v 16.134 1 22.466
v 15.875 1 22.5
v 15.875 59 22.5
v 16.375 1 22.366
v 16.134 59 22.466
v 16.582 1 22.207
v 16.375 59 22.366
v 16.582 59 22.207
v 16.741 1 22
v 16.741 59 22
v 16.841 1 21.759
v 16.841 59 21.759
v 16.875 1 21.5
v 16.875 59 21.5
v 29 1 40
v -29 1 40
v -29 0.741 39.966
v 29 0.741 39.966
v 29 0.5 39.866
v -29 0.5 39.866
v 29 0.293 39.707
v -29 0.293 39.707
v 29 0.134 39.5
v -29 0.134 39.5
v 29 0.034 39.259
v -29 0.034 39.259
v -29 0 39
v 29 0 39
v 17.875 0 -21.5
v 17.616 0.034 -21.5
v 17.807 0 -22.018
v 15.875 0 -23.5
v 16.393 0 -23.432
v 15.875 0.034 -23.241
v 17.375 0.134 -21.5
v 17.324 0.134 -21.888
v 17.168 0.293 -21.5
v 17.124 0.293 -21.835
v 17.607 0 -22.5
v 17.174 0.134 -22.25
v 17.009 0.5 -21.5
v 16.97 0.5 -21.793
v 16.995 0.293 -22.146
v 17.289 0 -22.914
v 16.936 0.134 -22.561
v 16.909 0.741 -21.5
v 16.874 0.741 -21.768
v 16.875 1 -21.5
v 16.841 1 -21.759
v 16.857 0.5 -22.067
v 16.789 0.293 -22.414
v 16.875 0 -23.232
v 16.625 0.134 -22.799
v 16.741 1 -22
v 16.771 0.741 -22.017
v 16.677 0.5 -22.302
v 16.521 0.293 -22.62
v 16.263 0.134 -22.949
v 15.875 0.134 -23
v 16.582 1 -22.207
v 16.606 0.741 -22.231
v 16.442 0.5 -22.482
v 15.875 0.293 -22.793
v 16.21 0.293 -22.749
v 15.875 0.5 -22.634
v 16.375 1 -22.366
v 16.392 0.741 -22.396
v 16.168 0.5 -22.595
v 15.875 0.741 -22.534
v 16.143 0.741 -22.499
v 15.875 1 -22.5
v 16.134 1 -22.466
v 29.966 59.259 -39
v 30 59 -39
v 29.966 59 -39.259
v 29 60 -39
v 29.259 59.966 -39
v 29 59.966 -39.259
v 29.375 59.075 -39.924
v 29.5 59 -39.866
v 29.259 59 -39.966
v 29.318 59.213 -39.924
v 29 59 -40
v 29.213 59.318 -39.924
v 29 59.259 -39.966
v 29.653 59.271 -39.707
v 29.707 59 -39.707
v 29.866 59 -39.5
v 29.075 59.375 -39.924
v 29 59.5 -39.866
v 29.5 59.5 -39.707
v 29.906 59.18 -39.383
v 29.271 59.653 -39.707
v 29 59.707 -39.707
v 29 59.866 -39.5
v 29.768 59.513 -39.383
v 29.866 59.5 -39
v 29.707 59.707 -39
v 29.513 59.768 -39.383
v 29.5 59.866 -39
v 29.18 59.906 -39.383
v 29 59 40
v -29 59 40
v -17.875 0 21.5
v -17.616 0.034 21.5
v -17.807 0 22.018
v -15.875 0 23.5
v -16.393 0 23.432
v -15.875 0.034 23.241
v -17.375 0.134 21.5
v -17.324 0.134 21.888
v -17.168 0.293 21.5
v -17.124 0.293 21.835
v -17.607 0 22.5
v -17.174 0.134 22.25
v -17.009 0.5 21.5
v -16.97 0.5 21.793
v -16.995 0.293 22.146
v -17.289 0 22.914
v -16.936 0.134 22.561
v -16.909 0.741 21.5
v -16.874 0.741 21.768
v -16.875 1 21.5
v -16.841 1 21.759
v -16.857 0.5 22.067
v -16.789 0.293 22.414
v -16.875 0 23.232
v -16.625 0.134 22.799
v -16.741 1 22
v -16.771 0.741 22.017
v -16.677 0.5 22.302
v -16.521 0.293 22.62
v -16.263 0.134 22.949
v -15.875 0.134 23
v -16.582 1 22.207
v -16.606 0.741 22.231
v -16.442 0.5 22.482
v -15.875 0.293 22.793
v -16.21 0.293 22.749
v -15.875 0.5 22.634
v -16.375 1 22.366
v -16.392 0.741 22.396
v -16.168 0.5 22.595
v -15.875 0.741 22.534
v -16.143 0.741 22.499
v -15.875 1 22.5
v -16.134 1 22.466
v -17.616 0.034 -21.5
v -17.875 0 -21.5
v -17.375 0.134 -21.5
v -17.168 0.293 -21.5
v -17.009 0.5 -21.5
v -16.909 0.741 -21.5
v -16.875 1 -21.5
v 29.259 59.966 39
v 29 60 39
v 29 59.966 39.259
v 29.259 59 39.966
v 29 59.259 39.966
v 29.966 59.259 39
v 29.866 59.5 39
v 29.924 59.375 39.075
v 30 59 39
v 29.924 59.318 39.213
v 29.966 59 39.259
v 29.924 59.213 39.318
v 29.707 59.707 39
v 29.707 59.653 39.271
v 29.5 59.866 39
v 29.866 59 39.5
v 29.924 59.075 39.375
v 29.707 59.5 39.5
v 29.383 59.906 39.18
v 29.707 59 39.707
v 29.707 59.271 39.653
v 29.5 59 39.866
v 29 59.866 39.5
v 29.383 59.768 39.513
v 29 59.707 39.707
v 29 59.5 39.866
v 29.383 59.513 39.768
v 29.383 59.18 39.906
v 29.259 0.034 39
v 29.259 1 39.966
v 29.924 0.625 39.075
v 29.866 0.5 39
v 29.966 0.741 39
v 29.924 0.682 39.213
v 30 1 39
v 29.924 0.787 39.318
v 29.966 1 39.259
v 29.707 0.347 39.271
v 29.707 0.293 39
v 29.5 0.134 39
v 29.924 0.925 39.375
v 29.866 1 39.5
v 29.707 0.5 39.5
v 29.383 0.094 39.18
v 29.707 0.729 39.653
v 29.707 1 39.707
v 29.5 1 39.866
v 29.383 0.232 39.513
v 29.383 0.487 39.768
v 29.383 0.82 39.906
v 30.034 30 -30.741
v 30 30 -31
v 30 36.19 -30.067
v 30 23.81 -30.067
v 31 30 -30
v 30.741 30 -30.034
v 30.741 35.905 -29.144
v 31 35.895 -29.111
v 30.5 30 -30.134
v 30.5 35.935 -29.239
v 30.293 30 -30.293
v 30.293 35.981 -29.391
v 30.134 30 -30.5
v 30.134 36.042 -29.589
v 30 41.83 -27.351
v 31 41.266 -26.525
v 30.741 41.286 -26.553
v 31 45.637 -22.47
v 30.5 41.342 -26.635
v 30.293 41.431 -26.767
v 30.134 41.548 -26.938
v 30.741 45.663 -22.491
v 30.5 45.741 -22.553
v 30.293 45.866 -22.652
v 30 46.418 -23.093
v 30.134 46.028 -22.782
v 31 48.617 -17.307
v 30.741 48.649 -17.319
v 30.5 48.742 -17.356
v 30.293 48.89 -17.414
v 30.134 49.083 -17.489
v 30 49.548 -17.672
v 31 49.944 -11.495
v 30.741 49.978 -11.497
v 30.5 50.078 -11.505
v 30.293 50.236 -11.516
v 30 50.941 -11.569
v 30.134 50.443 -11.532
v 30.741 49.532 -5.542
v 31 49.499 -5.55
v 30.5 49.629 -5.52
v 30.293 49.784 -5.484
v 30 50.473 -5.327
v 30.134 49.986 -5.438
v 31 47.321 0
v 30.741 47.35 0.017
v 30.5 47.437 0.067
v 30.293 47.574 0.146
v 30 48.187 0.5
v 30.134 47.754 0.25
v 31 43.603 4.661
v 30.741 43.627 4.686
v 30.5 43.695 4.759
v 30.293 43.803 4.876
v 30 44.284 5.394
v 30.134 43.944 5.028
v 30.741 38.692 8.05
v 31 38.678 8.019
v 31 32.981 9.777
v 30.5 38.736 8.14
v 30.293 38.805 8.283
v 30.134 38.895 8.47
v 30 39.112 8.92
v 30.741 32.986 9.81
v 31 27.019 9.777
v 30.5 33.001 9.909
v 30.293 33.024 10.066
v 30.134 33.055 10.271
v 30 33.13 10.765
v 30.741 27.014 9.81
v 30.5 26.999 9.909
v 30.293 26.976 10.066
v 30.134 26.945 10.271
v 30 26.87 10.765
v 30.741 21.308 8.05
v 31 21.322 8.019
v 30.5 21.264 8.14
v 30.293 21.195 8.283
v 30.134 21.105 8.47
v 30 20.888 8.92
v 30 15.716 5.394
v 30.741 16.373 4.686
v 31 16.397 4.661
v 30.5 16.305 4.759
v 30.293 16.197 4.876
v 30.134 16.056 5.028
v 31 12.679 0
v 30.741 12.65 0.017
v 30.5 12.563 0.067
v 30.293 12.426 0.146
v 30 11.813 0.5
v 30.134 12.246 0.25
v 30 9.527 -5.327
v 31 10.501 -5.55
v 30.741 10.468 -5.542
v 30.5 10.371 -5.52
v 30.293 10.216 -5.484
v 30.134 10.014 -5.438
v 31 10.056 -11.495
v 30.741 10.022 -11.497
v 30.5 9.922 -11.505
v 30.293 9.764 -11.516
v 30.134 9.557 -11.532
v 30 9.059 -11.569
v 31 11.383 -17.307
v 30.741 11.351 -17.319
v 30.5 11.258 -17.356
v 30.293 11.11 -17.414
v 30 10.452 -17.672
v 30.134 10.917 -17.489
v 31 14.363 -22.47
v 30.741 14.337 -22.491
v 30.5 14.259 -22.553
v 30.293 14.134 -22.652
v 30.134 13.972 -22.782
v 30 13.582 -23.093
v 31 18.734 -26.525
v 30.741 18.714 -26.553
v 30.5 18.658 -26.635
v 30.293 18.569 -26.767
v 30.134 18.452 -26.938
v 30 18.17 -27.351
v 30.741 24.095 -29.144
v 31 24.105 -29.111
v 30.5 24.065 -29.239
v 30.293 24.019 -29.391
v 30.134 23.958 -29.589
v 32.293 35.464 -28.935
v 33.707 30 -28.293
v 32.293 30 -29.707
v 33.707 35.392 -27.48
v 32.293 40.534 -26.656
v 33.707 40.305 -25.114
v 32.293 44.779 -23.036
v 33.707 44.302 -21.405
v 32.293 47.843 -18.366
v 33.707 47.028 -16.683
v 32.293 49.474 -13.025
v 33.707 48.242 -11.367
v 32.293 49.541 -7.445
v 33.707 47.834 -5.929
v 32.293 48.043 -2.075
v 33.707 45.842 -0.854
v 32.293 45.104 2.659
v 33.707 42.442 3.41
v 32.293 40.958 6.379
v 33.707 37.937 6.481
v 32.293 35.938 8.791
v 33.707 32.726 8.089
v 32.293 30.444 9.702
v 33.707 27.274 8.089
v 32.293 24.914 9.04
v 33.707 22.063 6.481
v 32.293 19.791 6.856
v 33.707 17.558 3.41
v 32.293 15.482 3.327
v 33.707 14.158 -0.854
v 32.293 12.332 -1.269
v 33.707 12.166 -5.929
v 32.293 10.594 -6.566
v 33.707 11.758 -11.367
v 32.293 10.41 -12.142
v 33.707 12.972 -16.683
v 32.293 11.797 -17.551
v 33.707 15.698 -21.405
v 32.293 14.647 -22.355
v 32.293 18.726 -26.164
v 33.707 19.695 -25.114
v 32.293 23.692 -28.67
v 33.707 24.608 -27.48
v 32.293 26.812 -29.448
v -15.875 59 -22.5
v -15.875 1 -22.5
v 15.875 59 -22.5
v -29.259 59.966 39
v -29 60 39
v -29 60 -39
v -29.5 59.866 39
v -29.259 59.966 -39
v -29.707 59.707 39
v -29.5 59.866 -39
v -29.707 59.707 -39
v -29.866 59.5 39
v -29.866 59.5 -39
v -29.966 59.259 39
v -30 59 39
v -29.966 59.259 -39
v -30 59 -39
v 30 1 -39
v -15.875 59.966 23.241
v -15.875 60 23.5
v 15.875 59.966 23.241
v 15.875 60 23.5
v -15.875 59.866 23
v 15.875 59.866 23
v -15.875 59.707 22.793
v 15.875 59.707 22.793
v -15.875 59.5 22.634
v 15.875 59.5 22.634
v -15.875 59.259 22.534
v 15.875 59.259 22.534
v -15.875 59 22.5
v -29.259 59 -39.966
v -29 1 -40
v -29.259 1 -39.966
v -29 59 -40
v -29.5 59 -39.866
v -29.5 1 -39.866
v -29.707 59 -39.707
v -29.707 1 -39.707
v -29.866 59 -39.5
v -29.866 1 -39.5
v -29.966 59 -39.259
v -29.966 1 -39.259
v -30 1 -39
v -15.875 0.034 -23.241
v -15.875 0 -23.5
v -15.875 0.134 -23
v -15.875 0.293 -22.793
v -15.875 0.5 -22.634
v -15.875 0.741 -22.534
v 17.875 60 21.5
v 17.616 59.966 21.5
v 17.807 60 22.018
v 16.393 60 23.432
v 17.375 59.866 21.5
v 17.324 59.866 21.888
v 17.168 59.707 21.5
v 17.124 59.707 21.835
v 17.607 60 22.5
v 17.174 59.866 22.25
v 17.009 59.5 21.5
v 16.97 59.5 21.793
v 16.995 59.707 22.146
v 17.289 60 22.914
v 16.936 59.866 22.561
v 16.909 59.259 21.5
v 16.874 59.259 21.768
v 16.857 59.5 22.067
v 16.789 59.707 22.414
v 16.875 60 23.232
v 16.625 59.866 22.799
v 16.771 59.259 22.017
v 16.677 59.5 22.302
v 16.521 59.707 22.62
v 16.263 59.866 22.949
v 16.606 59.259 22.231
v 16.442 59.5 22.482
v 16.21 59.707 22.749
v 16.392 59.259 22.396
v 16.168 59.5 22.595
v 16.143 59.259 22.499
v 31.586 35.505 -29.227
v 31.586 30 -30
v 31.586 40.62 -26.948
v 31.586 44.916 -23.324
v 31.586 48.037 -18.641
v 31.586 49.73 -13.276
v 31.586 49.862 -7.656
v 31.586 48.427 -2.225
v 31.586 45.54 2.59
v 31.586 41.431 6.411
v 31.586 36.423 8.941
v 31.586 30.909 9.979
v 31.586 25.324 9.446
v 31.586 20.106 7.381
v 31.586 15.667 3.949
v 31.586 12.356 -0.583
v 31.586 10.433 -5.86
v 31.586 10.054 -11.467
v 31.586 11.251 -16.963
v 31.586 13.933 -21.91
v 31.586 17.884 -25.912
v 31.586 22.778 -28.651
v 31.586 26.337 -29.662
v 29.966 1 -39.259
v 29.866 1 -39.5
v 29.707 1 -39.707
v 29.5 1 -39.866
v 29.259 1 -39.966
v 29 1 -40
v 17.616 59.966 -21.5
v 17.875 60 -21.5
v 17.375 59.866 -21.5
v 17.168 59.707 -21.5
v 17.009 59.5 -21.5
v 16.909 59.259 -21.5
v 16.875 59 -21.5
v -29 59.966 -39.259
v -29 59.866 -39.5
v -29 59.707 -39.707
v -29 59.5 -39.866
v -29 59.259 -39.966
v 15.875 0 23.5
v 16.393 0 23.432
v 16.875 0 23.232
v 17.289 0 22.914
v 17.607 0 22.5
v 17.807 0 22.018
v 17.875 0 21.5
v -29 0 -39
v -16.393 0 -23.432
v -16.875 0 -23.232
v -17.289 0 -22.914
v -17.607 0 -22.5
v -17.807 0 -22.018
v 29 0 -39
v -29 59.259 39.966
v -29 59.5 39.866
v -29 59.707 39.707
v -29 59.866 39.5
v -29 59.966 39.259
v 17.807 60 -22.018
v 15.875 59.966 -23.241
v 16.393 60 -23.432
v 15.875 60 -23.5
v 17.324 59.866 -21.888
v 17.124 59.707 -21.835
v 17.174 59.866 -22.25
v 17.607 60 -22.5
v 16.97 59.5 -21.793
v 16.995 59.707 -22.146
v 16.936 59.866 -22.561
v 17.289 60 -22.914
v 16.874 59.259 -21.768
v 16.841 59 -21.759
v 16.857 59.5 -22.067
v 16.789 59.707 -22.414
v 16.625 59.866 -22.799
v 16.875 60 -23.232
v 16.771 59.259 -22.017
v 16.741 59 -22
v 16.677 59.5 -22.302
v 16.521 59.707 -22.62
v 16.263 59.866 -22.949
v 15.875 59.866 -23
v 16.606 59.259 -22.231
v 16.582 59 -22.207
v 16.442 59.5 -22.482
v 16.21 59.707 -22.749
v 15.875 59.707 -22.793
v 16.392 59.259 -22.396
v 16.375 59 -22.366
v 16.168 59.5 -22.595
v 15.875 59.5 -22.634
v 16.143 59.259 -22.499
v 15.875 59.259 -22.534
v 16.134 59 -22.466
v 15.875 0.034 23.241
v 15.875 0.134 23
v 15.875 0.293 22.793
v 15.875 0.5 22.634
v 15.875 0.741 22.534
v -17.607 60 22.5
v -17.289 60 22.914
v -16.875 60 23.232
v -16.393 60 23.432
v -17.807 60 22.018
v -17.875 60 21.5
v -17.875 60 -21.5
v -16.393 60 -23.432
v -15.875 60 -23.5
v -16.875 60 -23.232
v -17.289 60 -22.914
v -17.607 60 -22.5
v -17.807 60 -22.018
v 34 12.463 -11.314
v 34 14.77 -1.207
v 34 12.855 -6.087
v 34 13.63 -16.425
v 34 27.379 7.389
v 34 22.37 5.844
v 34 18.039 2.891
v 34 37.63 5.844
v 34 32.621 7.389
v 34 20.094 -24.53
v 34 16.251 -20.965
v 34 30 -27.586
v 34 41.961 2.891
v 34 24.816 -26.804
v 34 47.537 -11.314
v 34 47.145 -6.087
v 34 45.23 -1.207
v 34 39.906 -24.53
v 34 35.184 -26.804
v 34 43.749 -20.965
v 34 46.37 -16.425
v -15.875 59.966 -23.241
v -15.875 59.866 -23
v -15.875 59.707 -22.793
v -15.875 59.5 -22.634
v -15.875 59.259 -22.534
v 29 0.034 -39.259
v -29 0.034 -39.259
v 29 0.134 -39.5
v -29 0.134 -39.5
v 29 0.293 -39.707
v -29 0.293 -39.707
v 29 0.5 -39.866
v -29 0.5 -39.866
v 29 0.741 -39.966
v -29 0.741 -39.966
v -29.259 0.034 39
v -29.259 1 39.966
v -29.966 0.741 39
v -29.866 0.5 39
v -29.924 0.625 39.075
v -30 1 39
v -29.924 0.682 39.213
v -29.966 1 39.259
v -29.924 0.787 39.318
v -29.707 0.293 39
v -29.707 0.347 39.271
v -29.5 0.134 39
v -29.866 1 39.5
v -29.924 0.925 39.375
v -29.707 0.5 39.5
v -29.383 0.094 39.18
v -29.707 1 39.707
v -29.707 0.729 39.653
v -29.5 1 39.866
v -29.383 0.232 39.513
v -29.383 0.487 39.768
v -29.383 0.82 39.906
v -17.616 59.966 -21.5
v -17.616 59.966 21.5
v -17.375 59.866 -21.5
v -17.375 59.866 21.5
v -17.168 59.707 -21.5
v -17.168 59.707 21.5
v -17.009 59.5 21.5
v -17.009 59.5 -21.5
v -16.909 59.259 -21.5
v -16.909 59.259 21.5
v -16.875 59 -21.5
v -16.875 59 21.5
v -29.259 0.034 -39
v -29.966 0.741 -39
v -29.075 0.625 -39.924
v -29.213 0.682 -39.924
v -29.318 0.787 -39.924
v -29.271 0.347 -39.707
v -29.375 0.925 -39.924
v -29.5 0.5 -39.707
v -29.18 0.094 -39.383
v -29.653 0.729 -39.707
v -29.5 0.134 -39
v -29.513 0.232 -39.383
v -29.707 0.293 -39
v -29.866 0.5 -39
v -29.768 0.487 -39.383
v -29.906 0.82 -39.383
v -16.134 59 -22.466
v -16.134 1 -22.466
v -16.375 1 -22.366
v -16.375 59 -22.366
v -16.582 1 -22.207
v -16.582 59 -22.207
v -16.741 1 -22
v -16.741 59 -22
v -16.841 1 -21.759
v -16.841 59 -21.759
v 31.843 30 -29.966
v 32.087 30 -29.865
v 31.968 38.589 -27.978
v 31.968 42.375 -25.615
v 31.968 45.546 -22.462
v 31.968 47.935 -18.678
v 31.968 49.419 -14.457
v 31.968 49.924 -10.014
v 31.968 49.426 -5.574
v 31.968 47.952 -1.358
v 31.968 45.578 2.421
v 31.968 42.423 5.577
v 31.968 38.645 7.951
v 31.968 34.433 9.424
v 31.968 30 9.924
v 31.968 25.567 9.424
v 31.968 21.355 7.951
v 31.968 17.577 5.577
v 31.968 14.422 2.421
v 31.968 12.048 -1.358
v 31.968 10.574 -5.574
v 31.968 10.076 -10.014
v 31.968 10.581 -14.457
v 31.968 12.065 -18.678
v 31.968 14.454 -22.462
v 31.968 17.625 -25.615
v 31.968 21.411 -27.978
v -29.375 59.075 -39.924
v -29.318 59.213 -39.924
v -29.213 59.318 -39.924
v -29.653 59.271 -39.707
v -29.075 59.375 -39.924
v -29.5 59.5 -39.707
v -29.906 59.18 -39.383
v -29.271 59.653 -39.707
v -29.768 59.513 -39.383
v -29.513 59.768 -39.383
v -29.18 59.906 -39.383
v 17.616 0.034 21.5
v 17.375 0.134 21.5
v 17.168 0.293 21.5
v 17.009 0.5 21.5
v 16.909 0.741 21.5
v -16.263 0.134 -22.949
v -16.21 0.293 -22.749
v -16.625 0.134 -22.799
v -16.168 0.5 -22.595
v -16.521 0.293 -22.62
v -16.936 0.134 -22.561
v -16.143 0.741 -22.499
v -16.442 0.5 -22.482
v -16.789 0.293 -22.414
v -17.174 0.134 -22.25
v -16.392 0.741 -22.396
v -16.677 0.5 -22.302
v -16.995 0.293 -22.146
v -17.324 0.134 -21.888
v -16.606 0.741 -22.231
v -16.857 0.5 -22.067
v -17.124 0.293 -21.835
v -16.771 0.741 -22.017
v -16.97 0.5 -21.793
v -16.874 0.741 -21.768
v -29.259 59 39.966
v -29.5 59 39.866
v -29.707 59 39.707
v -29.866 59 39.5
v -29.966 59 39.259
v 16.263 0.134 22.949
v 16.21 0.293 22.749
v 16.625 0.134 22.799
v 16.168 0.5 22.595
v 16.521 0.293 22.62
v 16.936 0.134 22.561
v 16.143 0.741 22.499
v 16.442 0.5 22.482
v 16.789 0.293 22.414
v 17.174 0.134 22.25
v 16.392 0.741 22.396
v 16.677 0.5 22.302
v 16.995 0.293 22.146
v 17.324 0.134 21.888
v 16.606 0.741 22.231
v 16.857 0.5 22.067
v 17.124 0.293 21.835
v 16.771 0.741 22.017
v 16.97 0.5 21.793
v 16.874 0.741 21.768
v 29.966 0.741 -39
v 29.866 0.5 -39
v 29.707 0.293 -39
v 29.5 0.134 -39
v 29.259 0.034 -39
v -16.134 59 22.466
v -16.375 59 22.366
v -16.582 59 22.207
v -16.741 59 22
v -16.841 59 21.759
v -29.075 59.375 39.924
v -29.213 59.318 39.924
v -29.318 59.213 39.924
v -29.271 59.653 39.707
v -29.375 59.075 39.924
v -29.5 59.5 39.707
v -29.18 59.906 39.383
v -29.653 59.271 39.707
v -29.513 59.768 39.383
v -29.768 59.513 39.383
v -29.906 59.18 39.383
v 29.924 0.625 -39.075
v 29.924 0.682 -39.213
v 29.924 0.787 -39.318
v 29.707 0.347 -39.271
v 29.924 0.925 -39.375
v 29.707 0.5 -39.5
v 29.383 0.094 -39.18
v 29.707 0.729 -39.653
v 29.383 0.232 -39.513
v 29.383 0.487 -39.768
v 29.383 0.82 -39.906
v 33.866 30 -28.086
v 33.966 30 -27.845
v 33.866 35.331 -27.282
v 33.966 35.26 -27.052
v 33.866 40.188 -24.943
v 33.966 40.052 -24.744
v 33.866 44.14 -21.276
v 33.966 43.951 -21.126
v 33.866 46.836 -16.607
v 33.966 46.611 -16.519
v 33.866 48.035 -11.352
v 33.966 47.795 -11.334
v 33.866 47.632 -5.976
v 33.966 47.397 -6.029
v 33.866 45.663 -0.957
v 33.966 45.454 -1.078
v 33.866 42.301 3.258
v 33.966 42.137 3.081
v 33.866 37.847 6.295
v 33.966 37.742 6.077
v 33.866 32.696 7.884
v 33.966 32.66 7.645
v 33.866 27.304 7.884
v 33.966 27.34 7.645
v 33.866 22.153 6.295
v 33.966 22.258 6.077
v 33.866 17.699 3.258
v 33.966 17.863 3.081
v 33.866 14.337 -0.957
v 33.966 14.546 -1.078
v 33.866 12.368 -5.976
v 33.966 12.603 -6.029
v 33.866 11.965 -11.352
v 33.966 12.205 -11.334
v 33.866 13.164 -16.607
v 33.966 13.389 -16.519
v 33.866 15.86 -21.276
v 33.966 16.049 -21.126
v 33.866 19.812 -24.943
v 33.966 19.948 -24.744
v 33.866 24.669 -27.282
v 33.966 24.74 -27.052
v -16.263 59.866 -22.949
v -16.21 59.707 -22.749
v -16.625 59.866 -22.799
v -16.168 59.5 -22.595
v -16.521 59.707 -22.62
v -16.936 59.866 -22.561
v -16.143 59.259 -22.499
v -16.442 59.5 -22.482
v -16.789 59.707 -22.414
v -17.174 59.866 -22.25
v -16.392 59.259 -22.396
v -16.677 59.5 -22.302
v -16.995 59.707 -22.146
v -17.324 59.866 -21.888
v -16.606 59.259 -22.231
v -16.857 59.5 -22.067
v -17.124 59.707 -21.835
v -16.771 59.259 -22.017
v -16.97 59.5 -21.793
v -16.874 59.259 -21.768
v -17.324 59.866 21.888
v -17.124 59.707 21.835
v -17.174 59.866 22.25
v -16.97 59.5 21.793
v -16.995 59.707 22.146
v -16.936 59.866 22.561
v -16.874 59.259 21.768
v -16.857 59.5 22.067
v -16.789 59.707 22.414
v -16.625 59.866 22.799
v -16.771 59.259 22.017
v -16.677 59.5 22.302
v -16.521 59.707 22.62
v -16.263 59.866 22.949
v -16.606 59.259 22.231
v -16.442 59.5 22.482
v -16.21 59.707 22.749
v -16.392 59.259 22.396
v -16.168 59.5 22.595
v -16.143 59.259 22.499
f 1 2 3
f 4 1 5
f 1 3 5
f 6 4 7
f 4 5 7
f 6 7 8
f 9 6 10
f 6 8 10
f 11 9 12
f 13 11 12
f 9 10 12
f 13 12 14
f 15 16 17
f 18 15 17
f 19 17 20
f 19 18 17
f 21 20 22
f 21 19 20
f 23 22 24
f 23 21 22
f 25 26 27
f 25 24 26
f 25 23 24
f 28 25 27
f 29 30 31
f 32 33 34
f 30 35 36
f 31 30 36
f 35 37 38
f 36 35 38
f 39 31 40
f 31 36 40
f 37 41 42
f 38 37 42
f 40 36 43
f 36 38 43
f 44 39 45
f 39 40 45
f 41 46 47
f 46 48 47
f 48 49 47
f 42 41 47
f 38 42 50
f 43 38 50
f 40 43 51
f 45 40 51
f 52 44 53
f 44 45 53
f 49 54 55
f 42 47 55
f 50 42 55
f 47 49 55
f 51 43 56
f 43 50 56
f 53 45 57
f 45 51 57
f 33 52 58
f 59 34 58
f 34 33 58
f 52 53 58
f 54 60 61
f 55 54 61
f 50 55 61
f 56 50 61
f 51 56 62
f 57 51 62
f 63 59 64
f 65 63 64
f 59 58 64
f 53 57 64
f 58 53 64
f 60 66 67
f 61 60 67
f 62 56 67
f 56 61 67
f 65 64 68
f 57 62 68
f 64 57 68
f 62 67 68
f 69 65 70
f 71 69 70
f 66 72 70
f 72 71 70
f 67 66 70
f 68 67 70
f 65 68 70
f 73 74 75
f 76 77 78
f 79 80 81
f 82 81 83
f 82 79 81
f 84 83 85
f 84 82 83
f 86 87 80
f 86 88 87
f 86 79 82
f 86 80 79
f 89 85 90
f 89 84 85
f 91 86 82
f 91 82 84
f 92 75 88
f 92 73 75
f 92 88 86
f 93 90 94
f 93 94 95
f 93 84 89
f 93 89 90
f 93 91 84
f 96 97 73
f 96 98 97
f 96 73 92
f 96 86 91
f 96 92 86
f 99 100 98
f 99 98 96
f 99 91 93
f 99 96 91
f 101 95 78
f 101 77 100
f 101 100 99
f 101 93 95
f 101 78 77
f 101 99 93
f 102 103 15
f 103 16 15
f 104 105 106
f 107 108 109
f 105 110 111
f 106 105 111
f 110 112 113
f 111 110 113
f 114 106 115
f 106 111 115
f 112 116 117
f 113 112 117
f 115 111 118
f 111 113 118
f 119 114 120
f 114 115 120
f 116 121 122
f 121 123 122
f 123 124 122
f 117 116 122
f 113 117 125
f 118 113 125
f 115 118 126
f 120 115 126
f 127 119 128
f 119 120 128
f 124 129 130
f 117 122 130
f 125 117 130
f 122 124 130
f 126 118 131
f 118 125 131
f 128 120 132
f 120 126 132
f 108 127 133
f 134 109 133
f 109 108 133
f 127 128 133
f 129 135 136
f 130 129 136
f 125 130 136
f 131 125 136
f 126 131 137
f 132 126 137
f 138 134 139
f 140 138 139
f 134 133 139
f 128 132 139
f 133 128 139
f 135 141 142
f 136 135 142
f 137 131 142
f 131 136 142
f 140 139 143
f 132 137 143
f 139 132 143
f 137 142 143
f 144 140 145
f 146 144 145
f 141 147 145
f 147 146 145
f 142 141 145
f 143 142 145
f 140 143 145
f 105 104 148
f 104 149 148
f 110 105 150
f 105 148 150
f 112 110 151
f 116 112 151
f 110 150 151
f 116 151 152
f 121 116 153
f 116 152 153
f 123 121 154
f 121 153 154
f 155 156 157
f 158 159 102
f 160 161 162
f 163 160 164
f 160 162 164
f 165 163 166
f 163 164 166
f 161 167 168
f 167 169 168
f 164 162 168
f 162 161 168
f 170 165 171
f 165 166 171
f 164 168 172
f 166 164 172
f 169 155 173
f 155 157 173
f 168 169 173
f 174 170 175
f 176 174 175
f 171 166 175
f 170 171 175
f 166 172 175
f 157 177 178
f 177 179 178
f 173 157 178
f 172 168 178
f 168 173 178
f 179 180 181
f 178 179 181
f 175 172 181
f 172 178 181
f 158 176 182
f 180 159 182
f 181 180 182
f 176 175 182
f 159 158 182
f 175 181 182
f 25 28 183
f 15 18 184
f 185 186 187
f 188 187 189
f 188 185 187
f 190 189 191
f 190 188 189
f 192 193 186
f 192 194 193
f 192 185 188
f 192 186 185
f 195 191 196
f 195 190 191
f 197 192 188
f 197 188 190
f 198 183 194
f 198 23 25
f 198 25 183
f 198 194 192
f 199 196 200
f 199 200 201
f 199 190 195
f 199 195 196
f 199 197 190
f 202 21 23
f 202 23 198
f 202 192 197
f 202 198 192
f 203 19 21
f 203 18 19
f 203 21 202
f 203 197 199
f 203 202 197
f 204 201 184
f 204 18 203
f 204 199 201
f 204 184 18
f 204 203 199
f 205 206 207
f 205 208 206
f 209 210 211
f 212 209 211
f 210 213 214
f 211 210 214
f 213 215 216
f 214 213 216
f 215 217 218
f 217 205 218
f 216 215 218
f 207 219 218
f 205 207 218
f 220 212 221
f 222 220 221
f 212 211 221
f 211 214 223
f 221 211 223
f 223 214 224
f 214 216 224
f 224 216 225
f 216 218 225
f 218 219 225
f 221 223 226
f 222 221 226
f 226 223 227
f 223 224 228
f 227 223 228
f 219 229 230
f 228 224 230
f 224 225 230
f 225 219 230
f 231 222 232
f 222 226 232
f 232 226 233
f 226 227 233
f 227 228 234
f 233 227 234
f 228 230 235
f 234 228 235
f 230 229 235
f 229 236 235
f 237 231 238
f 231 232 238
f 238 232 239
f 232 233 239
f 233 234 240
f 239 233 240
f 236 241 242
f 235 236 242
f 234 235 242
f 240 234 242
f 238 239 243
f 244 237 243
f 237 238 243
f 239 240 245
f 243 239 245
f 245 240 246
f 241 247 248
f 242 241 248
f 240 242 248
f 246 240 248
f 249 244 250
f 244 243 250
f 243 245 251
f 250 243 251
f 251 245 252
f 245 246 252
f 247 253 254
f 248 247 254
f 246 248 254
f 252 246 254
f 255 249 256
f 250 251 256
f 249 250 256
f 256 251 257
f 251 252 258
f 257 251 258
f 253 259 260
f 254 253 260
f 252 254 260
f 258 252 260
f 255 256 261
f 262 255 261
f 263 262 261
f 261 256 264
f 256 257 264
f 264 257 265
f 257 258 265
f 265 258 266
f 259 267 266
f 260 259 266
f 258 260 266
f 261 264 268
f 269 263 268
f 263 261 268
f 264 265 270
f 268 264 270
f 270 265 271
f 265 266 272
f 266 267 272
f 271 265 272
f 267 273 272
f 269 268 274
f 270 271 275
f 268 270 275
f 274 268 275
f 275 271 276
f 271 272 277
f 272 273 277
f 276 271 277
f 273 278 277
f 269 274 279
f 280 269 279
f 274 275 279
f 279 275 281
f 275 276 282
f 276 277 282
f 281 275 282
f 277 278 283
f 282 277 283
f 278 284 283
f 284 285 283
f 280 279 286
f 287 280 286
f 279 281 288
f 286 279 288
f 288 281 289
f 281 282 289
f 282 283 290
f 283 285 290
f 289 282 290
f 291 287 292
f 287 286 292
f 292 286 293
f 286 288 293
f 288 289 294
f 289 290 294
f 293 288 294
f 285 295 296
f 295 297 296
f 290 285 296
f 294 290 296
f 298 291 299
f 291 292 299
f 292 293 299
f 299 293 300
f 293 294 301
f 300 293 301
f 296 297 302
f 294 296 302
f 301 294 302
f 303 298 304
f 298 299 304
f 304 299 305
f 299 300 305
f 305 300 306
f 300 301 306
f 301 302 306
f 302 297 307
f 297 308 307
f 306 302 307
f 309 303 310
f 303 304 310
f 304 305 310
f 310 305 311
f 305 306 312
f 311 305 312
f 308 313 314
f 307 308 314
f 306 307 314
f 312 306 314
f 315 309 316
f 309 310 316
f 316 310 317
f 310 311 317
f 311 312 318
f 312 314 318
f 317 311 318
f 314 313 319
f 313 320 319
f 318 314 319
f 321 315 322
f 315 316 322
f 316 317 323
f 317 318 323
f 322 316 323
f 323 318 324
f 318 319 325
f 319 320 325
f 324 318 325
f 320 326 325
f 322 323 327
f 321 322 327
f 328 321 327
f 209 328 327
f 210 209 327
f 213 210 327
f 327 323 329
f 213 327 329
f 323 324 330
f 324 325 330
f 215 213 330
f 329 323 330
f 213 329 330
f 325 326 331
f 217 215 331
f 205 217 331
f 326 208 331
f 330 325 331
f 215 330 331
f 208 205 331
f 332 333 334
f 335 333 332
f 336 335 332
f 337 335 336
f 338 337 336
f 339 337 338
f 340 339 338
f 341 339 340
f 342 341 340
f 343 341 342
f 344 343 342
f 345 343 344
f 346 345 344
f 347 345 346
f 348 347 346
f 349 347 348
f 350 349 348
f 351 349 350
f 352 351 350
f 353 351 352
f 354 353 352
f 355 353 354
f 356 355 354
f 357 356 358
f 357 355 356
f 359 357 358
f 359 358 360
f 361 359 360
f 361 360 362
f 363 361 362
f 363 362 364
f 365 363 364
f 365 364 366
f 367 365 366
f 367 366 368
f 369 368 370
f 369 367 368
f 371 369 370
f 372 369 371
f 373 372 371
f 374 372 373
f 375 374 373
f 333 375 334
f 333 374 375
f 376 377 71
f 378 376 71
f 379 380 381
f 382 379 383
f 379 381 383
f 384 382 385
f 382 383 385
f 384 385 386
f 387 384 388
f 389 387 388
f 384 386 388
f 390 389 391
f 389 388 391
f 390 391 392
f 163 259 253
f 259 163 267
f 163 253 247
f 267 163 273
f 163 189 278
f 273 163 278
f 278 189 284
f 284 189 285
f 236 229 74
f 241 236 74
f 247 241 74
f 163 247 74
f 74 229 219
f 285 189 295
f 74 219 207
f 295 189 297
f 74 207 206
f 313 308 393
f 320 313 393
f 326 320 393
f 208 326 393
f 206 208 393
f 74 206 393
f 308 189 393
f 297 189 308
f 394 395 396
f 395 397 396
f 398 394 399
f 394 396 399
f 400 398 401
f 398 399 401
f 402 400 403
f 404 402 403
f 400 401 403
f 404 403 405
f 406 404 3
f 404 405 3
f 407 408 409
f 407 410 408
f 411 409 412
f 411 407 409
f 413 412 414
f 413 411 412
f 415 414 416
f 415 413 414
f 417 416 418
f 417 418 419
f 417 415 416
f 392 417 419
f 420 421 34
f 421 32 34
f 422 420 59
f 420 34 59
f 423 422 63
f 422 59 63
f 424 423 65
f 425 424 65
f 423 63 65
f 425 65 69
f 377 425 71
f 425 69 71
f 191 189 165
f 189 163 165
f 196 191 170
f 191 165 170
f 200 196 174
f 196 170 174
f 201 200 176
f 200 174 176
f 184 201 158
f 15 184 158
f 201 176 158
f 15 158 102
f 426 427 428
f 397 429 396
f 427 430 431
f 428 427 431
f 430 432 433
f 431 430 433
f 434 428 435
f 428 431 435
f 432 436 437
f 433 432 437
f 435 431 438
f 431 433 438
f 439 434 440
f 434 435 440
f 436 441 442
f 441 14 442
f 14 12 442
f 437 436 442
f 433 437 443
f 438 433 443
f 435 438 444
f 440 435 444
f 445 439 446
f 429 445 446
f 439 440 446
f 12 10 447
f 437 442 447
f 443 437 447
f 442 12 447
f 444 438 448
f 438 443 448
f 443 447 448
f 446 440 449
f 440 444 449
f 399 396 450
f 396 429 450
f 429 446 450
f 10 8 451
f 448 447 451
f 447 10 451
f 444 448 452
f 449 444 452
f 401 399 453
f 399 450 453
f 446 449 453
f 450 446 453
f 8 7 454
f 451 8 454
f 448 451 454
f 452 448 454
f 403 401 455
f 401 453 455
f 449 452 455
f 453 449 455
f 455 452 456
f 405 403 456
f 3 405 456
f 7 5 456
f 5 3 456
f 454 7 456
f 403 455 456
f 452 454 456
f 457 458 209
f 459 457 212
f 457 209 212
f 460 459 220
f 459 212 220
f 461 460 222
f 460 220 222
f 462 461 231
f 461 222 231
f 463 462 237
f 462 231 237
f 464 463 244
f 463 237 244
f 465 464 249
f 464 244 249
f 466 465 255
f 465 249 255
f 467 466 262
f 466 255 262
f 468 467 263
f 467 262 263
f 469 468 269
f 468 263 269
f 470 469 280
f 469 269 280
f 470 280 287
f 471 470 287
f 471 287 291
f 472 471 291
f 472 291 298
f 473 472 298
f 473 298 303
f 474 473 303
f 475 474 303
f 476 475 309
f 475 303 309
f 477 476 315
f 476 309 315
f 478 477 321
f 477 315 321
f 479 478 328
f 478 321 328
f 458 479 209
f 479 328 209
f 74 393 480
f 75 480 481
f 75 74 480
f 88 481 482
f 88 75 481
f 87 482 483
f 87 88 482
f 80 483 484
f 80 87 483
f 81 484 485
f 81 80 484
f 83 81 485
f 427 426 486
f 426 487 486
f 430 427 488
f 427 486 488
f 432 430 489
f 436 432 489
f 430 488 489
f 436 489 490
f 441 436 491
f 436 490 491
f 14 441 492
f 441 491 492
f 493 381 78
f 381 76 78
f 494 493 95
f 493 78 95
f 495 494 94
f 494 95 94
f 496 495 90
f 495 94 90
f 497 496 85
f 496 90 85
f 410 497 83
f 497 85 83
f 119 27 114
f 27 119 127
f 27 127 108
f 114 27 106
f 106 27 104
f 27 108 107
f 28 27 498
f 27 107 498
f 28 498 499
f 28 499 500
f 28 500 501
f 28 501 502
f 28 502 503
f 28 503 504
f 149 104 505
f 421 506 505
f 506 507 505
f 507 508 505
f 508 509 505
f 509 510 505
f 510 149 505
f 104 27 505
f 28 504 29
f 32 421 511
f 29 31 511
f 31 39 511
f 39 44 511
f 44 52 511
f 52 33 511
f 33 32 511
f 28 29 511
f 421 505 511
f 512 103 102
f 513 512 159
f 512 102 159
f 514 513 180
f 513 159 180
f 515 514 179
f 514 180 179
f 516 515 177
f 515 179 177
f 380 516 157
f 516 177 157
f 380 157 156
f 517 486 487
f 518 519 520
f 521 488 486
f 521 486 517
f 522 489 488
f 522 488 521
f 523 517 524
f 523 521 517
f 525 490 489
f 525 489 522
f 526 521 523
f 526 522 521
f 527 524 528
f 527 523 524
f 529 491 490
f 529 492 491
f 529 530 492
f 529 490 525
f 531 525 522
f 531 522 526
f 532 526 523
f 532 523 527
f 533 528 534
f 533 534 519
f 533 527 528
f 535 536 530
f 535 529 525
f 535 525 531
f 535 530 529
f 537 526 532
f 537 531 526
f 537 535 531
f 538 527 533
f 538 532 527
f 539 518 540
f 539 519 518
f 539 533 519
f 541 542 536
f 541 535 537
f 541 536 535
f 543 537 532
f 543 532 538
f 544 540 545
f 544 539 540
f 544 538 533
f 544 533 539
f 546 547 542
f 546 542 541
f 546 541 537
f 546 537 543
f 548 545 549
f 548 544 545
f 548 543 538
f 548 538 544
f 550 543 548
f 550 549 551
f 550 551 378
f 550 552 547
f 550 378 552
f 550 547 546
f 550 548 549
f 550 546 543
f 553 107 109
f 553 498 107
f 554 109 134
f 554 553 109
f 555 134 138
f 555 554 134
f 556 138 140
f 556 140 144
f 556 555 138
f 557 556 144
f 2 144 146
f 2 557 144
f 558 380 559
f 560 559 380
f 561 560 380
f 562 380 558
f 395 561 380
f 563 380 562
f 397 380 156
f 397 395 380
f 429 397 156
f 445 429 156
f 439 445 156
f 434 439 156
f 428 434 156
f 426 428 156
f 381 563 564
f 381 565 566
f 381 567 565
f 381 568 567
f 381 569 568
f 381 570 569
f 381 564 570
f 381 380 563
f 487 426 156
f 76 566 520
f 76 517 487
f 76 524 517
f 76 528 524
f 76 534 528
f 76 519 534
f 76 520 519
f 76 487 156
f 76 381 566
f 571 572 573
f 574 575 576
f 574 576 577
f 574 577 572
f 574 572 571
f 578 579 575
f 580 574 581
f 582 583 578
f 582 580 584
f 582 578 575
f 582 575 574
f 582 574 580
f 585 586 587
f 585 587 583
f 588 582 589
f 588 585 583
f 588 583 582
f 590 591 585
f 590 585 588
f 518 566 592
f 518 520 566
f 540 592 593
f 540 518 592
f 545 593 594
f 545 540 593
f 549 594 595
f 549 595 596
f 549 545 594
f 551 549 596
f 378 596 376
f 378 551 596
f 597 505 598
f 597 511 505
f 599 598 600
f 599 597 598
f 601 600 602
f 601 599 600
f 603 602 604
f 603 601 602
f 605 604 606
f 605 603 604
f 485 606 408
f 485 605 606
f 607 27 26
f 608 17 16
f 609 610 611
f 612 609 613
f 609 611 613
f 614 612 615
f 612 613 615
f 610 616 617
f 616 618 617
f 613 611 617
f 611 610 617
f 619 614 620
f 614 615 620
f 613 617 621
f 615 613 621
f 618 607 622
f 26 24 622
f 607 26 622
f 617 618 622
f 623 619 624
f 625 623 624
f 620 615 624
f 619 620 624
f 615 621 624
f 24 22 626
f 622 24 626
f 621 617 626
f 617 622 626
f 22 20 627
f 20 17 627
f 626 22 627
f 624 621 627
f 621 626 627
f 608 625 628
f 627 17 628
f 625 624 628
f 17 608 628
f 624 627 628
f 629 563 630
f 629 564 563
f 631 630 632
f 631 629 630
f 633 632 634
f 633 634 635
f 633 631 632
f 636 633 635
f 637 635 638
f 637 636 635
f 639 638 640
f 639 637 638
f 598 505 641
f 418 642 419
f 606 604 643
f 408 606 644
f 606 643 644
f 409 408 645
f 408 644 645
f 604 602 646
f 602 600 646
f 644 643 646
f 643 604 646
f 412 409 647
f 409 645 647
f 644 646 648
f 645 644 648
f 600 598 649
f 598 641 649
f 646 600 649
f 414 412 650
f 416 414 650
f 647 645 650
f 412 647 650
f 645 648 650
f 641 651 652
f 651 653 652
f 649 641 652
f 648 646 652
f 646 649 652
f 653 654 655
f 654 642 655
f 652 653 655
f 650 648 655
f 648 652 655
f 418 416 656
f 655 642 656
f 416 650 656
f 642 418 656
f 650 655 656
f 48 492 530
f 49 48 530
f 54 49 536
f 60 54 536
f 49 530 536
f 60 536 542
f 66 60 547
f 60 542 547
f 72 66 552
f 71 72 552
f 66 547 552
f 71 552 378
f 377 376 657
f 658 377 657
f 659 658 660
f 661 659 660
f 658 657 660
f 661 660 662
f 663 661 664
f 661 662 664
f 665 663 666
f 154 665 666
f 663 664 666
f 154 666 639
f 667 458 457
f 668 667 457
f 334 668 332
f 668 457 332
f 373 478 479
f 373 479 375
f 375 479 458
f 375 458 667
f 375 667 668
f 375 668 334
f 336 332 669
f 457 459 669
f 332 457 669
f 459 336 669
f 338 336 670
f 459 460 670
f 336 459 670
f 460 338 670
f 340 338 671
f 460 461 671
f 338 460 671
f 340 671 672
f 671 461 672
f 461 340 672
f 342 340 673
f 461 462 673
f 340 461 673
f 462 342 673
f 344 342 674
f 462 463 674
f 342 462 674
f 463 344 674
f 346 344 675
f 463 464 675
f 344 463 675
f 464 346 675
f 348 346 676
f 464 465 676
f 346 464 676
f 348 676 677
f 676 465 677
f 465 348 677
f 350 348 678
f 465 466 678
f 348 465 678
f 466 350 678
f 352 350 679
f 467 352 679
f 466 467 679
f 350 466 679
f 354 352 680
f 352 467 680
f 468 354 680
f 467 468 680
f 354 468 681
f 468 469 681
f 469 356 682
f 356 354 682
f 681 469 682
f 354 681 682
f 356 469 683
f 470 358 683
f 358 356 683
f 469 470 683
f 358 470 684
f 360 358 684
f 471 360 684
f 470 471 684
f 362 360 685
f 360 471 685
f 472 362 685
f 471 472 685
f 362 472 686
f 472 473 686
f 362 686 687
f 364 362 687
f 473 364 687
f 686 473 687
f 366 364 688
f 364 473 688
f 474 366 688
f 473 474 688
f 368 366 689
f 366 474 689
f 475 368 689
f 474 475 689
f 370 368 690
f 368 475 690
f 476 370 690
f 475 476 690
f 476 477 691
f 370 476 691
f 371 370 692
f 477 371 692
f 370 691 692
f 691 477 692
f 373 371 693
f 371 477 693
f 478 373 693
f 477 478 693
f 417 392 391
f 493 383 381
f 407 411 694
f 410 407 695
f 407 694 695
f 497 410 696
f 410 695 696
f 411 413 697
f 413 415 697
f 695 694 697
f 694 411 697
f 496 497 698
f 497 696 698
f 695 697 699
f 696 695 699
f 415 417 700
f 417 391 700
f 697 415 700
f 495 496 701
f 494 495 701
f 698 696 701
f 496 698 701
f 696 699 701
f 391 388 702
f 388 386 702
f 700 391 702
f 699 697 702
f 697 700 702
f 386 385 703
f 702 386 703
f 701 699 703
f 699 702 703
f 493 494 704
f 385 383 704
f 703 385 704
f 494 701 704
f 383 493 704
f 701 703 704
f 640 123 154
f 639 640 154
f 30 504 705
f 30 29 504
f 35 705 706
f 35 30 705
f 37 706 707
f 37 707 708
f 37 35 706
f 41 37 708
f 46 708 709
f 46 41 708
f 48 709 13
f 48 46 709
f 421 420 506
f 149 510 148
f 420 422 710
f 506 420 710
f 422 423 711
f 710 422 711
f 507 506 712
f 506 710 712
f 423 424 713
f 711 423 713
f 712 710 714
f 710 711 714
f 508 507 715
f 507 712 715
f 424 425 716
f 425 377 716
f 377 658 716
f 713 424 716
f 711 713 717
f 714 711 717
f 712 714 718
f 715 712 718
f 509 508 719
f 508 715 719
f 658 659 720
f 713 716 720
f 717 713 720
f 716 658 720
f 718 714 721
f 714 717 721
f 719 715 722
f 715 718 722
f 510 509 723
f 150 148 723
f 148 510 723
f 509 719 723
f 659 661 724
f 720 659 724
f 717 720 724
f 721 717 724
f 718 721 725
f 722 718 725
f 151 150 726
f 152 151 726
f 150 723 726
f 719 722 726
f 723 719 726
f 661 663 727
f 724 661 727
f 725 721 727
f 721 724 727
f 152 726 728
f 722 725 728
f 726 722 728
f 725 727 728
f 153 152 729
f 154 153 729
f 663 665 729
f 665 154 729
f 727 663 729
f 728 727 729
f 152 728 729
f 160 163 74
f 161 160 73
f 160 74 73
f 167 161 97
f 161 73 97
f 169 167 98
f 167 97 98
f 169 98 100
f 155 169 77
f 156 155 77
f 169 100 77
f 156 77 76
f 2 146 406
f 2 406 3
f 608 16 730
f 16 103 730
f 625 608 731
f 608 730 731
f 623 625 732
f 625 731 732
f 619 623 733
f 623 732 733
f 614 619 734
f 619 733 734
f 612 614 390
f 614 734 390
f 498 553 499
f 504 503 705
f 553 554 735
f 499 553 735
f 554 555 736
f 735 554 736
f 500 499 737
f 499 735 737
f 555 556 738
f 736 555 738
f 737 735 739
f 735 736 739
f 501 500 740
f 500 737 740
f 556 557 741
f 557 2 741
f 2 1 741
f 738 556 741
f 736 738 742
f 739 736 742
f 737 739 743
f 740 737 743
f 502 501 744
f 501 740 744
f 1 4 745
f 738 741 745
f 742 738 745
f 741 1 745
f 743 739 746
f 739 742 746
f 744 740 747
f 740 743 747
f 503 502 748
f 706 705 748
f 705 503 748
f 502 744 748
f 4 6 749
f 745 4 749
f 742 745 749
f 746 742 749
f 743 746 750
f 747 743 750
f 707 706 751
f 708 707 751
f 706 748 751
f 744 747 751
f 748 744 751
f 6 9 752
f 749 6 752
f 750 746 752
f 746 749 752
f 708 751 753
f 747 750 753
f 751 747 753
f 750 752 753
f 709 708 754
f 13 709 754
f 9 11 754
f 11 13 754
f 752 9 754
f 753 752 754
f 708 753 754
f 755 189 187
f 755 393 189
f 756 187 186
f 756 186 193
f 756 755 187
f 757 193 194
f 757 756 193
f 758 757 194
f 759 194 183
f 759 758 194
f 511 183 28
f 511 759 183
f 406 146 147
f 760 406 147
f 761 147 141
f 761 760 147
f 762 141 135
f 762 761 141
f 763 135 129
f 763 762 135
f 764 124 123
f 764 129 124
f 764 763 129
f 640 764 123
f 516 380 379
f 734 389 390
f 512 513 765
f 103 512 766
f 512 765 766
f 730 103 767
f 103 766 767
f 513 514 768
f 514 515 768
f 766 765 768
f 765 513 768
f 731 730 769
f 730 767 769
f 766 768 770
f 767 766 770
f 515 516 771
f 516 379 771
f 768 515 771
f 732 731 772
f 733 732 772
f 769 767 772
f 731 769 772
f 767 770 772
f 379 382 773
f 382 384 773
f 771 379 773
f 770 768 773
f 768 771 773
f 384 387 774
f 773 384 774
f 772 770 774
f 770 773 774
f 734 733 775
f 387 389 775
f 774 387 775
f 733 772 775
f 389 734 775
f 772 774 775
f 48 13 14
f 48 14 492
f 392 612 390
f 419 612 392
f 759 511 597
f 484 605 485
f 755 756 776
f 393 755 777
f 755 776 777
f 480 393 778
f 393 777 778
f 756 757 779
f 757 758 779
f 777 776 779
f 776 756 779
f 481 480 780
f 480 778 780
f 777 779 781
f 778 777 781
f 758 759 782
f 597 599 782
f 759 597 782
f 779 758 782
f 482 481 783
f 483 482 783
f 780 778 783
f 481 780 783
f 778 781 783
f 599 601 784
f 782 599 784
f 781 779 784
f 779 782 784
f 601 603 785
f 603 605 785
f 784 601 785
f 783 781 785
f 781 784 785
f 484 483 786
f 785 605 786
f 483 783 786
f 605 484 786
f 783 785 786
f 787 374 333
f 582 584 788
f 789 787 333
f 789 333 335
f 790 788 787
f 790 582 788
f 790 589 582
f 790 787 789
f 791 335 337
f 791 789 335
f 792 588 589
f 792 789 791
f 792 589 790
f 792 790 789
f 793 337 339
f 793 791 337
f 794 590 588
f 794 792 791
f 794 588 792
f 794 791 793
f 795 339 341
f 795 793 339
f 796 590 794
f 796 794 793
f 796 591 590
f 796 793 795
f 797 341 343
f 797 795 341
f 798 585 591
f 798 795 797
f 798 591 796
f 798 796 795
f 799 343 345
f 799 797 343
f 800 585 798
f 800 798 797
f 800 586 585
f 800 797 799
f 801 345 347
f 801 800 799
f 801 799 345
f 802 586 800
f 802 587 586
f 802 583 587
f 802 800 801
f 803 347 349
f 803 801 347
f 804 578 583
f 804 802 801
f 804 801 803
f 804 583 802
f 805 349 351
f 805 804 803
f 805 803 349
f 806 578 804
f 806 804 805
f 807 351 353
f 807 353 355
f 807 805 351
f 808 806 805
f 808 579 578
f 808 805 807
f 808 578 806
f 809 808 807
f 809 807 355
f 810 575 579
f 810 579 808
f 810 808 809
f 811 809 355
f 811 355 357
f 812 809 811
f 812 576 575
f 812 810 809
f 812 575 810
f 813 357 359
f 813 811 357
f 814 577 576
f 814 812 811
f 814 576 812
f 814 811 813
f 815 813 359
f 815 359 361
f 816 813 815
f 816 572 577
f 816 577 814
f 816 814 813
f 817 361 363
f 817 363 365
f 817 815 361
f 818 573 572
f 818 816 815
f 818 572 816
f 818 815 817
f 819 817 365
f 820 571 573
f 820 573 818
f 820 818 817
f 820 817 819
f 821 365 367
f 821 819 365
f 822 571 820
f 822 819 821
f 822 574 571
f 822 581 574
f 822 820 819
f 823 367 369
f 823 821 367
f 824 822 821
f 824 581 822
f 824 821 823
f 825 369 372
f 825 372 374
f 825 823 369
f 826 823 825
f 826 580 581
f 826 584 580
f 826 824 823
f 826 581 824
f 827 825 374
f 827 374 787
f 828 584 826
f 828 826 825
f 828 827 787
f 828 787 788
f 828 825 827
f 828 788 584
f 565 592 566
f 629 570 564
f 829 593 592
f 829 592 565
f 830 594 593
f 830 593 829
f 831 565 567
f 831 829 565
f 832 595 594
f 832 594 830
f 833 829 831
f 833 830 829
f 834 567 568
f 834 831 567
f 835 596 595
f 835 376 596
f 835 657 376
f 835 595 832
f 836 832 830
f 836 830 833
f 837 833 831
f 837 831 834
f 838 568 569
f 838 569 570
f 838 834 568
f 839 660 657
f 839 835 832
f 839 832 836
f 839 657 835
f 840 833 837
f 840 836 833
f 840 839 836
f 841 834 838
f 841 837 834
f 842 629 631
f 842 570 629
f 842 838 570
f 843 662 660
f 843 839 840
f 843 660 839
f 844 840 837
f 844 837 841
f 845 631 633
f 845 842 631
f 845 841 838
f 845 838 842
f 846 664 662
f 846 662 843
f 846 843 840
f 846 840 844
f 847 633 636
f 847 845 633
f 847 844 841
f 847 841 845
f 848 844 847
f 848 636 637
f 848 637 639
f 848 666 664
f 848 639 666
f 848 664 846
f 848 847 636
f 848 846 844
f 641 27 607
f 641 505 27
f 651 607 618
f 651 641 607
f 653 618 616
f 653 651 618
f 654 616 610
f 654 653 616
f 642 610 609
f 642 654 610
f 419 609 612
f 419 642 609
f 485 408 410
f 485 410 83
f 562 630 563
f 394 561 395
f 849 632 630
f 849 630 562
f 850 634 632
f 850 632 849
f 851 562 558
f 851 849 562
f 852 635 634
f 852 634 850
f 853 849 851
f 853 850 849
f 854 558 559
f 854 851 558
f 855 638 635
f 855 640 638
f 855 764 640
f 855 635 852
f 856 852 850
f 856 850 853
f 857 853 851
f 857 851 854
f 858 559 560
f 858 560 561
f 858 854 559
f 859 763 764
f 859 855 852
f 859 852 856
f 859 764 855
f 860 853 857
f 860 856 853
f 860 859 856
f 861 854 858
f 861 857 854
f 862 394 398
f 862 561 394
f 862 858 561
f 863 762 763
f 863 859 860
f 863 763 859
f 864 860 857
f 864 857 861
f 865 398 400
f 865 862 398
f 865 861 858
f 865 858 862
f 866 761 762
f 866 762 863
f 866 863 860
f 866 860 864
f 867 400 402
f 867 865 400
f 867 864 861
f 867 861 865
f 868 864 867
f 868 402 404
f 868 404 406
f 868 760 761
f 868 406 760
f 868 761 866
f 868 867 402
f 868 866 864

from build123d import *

# Parameters (mm, degrees)
SKETCH1_W           = 60
SKETCH1_H           = 80
SKETCH1_W_2         = 33.75
SKETCH1_H_2         = 45
BOSS_EXTRUDE1_DEPTH = 60
SKETCH2_R           = 20
BOSS_EXTRUDE2_DEPTH = 4
CHAMFER1_SIZE       = 2
FILLET1_R           = 1


with BuildPart() as part:
    # Sketch1 → Boss-Extrude1 (new body)
    with BuildSketch(Plane(origin=(0, 0, 0), x_dir=(1, 0, 0), z_dir=(0, 1, 0))):
        Rectangle(SKETCH1_W, SKETCH1_H)
        Rectangle(SKETCH1_W_2, SKETCH1_H_2, mode=Mode.SUBTRACT)
    extrude(amount=BOSS_EXTRUDE1_DEPTH)

    # Sketch2 → Boss-Extrude2 (add)
    with BuildSketch(Plane(origin=(30, 0, 0), x_dir=(0, 0, -1), z_dir=(1, 0, 0))):
        with Locations((10, 30)):
            Circle(SKETCH2_R)
    extrude(amount=BOSS_EXTRUDE2_DEPTH)

    # Chamfer1
    chamfer1_edges = [part.edges().sort_by_distance(p)[0] for p in [
        (34, 30, 10),
    ]]
    chamfer(chamfer1_edges, length=CHAMFER1_SIZE)

    # Fillet1
    fillet1_edges = [part.edges().sort_by_distance(p)[0] for p in [
        (-30, 60, 0),
        (16.875, 0, 0),
        (16.875, 30, 22.5),
        (0, 0, -22.5),
        (16.875, 30, -22.5),
        (-16.875, 0, 0),
        (-16.875, 30, -22.5),
        (0, 0, 22.5),
        (-16.875, 30, 22.5),
        (16.875, 60, 0),
        (0, 60, 40),
        (0, 60, -22.5),
        (-16.875, 60, 0),
        (0, 60, 22.5),
        (30, 30, 10),
        (34, 30, 8),
        (32, 30, 10),
        (30, 60, 0),
        (0, 0, 40),
        (-30, 0, 0),
        (0, 0, -40),
        (30, 0, 0),
        (30, 30, 40),
        (-30, 30, 40),
        (-30, 30, -40),
        (30, 30, -40),
        (0, 60, -40),
    ]]
    fillet(fillet1_edges, radius=FILLET1_R)


solid = part.part
